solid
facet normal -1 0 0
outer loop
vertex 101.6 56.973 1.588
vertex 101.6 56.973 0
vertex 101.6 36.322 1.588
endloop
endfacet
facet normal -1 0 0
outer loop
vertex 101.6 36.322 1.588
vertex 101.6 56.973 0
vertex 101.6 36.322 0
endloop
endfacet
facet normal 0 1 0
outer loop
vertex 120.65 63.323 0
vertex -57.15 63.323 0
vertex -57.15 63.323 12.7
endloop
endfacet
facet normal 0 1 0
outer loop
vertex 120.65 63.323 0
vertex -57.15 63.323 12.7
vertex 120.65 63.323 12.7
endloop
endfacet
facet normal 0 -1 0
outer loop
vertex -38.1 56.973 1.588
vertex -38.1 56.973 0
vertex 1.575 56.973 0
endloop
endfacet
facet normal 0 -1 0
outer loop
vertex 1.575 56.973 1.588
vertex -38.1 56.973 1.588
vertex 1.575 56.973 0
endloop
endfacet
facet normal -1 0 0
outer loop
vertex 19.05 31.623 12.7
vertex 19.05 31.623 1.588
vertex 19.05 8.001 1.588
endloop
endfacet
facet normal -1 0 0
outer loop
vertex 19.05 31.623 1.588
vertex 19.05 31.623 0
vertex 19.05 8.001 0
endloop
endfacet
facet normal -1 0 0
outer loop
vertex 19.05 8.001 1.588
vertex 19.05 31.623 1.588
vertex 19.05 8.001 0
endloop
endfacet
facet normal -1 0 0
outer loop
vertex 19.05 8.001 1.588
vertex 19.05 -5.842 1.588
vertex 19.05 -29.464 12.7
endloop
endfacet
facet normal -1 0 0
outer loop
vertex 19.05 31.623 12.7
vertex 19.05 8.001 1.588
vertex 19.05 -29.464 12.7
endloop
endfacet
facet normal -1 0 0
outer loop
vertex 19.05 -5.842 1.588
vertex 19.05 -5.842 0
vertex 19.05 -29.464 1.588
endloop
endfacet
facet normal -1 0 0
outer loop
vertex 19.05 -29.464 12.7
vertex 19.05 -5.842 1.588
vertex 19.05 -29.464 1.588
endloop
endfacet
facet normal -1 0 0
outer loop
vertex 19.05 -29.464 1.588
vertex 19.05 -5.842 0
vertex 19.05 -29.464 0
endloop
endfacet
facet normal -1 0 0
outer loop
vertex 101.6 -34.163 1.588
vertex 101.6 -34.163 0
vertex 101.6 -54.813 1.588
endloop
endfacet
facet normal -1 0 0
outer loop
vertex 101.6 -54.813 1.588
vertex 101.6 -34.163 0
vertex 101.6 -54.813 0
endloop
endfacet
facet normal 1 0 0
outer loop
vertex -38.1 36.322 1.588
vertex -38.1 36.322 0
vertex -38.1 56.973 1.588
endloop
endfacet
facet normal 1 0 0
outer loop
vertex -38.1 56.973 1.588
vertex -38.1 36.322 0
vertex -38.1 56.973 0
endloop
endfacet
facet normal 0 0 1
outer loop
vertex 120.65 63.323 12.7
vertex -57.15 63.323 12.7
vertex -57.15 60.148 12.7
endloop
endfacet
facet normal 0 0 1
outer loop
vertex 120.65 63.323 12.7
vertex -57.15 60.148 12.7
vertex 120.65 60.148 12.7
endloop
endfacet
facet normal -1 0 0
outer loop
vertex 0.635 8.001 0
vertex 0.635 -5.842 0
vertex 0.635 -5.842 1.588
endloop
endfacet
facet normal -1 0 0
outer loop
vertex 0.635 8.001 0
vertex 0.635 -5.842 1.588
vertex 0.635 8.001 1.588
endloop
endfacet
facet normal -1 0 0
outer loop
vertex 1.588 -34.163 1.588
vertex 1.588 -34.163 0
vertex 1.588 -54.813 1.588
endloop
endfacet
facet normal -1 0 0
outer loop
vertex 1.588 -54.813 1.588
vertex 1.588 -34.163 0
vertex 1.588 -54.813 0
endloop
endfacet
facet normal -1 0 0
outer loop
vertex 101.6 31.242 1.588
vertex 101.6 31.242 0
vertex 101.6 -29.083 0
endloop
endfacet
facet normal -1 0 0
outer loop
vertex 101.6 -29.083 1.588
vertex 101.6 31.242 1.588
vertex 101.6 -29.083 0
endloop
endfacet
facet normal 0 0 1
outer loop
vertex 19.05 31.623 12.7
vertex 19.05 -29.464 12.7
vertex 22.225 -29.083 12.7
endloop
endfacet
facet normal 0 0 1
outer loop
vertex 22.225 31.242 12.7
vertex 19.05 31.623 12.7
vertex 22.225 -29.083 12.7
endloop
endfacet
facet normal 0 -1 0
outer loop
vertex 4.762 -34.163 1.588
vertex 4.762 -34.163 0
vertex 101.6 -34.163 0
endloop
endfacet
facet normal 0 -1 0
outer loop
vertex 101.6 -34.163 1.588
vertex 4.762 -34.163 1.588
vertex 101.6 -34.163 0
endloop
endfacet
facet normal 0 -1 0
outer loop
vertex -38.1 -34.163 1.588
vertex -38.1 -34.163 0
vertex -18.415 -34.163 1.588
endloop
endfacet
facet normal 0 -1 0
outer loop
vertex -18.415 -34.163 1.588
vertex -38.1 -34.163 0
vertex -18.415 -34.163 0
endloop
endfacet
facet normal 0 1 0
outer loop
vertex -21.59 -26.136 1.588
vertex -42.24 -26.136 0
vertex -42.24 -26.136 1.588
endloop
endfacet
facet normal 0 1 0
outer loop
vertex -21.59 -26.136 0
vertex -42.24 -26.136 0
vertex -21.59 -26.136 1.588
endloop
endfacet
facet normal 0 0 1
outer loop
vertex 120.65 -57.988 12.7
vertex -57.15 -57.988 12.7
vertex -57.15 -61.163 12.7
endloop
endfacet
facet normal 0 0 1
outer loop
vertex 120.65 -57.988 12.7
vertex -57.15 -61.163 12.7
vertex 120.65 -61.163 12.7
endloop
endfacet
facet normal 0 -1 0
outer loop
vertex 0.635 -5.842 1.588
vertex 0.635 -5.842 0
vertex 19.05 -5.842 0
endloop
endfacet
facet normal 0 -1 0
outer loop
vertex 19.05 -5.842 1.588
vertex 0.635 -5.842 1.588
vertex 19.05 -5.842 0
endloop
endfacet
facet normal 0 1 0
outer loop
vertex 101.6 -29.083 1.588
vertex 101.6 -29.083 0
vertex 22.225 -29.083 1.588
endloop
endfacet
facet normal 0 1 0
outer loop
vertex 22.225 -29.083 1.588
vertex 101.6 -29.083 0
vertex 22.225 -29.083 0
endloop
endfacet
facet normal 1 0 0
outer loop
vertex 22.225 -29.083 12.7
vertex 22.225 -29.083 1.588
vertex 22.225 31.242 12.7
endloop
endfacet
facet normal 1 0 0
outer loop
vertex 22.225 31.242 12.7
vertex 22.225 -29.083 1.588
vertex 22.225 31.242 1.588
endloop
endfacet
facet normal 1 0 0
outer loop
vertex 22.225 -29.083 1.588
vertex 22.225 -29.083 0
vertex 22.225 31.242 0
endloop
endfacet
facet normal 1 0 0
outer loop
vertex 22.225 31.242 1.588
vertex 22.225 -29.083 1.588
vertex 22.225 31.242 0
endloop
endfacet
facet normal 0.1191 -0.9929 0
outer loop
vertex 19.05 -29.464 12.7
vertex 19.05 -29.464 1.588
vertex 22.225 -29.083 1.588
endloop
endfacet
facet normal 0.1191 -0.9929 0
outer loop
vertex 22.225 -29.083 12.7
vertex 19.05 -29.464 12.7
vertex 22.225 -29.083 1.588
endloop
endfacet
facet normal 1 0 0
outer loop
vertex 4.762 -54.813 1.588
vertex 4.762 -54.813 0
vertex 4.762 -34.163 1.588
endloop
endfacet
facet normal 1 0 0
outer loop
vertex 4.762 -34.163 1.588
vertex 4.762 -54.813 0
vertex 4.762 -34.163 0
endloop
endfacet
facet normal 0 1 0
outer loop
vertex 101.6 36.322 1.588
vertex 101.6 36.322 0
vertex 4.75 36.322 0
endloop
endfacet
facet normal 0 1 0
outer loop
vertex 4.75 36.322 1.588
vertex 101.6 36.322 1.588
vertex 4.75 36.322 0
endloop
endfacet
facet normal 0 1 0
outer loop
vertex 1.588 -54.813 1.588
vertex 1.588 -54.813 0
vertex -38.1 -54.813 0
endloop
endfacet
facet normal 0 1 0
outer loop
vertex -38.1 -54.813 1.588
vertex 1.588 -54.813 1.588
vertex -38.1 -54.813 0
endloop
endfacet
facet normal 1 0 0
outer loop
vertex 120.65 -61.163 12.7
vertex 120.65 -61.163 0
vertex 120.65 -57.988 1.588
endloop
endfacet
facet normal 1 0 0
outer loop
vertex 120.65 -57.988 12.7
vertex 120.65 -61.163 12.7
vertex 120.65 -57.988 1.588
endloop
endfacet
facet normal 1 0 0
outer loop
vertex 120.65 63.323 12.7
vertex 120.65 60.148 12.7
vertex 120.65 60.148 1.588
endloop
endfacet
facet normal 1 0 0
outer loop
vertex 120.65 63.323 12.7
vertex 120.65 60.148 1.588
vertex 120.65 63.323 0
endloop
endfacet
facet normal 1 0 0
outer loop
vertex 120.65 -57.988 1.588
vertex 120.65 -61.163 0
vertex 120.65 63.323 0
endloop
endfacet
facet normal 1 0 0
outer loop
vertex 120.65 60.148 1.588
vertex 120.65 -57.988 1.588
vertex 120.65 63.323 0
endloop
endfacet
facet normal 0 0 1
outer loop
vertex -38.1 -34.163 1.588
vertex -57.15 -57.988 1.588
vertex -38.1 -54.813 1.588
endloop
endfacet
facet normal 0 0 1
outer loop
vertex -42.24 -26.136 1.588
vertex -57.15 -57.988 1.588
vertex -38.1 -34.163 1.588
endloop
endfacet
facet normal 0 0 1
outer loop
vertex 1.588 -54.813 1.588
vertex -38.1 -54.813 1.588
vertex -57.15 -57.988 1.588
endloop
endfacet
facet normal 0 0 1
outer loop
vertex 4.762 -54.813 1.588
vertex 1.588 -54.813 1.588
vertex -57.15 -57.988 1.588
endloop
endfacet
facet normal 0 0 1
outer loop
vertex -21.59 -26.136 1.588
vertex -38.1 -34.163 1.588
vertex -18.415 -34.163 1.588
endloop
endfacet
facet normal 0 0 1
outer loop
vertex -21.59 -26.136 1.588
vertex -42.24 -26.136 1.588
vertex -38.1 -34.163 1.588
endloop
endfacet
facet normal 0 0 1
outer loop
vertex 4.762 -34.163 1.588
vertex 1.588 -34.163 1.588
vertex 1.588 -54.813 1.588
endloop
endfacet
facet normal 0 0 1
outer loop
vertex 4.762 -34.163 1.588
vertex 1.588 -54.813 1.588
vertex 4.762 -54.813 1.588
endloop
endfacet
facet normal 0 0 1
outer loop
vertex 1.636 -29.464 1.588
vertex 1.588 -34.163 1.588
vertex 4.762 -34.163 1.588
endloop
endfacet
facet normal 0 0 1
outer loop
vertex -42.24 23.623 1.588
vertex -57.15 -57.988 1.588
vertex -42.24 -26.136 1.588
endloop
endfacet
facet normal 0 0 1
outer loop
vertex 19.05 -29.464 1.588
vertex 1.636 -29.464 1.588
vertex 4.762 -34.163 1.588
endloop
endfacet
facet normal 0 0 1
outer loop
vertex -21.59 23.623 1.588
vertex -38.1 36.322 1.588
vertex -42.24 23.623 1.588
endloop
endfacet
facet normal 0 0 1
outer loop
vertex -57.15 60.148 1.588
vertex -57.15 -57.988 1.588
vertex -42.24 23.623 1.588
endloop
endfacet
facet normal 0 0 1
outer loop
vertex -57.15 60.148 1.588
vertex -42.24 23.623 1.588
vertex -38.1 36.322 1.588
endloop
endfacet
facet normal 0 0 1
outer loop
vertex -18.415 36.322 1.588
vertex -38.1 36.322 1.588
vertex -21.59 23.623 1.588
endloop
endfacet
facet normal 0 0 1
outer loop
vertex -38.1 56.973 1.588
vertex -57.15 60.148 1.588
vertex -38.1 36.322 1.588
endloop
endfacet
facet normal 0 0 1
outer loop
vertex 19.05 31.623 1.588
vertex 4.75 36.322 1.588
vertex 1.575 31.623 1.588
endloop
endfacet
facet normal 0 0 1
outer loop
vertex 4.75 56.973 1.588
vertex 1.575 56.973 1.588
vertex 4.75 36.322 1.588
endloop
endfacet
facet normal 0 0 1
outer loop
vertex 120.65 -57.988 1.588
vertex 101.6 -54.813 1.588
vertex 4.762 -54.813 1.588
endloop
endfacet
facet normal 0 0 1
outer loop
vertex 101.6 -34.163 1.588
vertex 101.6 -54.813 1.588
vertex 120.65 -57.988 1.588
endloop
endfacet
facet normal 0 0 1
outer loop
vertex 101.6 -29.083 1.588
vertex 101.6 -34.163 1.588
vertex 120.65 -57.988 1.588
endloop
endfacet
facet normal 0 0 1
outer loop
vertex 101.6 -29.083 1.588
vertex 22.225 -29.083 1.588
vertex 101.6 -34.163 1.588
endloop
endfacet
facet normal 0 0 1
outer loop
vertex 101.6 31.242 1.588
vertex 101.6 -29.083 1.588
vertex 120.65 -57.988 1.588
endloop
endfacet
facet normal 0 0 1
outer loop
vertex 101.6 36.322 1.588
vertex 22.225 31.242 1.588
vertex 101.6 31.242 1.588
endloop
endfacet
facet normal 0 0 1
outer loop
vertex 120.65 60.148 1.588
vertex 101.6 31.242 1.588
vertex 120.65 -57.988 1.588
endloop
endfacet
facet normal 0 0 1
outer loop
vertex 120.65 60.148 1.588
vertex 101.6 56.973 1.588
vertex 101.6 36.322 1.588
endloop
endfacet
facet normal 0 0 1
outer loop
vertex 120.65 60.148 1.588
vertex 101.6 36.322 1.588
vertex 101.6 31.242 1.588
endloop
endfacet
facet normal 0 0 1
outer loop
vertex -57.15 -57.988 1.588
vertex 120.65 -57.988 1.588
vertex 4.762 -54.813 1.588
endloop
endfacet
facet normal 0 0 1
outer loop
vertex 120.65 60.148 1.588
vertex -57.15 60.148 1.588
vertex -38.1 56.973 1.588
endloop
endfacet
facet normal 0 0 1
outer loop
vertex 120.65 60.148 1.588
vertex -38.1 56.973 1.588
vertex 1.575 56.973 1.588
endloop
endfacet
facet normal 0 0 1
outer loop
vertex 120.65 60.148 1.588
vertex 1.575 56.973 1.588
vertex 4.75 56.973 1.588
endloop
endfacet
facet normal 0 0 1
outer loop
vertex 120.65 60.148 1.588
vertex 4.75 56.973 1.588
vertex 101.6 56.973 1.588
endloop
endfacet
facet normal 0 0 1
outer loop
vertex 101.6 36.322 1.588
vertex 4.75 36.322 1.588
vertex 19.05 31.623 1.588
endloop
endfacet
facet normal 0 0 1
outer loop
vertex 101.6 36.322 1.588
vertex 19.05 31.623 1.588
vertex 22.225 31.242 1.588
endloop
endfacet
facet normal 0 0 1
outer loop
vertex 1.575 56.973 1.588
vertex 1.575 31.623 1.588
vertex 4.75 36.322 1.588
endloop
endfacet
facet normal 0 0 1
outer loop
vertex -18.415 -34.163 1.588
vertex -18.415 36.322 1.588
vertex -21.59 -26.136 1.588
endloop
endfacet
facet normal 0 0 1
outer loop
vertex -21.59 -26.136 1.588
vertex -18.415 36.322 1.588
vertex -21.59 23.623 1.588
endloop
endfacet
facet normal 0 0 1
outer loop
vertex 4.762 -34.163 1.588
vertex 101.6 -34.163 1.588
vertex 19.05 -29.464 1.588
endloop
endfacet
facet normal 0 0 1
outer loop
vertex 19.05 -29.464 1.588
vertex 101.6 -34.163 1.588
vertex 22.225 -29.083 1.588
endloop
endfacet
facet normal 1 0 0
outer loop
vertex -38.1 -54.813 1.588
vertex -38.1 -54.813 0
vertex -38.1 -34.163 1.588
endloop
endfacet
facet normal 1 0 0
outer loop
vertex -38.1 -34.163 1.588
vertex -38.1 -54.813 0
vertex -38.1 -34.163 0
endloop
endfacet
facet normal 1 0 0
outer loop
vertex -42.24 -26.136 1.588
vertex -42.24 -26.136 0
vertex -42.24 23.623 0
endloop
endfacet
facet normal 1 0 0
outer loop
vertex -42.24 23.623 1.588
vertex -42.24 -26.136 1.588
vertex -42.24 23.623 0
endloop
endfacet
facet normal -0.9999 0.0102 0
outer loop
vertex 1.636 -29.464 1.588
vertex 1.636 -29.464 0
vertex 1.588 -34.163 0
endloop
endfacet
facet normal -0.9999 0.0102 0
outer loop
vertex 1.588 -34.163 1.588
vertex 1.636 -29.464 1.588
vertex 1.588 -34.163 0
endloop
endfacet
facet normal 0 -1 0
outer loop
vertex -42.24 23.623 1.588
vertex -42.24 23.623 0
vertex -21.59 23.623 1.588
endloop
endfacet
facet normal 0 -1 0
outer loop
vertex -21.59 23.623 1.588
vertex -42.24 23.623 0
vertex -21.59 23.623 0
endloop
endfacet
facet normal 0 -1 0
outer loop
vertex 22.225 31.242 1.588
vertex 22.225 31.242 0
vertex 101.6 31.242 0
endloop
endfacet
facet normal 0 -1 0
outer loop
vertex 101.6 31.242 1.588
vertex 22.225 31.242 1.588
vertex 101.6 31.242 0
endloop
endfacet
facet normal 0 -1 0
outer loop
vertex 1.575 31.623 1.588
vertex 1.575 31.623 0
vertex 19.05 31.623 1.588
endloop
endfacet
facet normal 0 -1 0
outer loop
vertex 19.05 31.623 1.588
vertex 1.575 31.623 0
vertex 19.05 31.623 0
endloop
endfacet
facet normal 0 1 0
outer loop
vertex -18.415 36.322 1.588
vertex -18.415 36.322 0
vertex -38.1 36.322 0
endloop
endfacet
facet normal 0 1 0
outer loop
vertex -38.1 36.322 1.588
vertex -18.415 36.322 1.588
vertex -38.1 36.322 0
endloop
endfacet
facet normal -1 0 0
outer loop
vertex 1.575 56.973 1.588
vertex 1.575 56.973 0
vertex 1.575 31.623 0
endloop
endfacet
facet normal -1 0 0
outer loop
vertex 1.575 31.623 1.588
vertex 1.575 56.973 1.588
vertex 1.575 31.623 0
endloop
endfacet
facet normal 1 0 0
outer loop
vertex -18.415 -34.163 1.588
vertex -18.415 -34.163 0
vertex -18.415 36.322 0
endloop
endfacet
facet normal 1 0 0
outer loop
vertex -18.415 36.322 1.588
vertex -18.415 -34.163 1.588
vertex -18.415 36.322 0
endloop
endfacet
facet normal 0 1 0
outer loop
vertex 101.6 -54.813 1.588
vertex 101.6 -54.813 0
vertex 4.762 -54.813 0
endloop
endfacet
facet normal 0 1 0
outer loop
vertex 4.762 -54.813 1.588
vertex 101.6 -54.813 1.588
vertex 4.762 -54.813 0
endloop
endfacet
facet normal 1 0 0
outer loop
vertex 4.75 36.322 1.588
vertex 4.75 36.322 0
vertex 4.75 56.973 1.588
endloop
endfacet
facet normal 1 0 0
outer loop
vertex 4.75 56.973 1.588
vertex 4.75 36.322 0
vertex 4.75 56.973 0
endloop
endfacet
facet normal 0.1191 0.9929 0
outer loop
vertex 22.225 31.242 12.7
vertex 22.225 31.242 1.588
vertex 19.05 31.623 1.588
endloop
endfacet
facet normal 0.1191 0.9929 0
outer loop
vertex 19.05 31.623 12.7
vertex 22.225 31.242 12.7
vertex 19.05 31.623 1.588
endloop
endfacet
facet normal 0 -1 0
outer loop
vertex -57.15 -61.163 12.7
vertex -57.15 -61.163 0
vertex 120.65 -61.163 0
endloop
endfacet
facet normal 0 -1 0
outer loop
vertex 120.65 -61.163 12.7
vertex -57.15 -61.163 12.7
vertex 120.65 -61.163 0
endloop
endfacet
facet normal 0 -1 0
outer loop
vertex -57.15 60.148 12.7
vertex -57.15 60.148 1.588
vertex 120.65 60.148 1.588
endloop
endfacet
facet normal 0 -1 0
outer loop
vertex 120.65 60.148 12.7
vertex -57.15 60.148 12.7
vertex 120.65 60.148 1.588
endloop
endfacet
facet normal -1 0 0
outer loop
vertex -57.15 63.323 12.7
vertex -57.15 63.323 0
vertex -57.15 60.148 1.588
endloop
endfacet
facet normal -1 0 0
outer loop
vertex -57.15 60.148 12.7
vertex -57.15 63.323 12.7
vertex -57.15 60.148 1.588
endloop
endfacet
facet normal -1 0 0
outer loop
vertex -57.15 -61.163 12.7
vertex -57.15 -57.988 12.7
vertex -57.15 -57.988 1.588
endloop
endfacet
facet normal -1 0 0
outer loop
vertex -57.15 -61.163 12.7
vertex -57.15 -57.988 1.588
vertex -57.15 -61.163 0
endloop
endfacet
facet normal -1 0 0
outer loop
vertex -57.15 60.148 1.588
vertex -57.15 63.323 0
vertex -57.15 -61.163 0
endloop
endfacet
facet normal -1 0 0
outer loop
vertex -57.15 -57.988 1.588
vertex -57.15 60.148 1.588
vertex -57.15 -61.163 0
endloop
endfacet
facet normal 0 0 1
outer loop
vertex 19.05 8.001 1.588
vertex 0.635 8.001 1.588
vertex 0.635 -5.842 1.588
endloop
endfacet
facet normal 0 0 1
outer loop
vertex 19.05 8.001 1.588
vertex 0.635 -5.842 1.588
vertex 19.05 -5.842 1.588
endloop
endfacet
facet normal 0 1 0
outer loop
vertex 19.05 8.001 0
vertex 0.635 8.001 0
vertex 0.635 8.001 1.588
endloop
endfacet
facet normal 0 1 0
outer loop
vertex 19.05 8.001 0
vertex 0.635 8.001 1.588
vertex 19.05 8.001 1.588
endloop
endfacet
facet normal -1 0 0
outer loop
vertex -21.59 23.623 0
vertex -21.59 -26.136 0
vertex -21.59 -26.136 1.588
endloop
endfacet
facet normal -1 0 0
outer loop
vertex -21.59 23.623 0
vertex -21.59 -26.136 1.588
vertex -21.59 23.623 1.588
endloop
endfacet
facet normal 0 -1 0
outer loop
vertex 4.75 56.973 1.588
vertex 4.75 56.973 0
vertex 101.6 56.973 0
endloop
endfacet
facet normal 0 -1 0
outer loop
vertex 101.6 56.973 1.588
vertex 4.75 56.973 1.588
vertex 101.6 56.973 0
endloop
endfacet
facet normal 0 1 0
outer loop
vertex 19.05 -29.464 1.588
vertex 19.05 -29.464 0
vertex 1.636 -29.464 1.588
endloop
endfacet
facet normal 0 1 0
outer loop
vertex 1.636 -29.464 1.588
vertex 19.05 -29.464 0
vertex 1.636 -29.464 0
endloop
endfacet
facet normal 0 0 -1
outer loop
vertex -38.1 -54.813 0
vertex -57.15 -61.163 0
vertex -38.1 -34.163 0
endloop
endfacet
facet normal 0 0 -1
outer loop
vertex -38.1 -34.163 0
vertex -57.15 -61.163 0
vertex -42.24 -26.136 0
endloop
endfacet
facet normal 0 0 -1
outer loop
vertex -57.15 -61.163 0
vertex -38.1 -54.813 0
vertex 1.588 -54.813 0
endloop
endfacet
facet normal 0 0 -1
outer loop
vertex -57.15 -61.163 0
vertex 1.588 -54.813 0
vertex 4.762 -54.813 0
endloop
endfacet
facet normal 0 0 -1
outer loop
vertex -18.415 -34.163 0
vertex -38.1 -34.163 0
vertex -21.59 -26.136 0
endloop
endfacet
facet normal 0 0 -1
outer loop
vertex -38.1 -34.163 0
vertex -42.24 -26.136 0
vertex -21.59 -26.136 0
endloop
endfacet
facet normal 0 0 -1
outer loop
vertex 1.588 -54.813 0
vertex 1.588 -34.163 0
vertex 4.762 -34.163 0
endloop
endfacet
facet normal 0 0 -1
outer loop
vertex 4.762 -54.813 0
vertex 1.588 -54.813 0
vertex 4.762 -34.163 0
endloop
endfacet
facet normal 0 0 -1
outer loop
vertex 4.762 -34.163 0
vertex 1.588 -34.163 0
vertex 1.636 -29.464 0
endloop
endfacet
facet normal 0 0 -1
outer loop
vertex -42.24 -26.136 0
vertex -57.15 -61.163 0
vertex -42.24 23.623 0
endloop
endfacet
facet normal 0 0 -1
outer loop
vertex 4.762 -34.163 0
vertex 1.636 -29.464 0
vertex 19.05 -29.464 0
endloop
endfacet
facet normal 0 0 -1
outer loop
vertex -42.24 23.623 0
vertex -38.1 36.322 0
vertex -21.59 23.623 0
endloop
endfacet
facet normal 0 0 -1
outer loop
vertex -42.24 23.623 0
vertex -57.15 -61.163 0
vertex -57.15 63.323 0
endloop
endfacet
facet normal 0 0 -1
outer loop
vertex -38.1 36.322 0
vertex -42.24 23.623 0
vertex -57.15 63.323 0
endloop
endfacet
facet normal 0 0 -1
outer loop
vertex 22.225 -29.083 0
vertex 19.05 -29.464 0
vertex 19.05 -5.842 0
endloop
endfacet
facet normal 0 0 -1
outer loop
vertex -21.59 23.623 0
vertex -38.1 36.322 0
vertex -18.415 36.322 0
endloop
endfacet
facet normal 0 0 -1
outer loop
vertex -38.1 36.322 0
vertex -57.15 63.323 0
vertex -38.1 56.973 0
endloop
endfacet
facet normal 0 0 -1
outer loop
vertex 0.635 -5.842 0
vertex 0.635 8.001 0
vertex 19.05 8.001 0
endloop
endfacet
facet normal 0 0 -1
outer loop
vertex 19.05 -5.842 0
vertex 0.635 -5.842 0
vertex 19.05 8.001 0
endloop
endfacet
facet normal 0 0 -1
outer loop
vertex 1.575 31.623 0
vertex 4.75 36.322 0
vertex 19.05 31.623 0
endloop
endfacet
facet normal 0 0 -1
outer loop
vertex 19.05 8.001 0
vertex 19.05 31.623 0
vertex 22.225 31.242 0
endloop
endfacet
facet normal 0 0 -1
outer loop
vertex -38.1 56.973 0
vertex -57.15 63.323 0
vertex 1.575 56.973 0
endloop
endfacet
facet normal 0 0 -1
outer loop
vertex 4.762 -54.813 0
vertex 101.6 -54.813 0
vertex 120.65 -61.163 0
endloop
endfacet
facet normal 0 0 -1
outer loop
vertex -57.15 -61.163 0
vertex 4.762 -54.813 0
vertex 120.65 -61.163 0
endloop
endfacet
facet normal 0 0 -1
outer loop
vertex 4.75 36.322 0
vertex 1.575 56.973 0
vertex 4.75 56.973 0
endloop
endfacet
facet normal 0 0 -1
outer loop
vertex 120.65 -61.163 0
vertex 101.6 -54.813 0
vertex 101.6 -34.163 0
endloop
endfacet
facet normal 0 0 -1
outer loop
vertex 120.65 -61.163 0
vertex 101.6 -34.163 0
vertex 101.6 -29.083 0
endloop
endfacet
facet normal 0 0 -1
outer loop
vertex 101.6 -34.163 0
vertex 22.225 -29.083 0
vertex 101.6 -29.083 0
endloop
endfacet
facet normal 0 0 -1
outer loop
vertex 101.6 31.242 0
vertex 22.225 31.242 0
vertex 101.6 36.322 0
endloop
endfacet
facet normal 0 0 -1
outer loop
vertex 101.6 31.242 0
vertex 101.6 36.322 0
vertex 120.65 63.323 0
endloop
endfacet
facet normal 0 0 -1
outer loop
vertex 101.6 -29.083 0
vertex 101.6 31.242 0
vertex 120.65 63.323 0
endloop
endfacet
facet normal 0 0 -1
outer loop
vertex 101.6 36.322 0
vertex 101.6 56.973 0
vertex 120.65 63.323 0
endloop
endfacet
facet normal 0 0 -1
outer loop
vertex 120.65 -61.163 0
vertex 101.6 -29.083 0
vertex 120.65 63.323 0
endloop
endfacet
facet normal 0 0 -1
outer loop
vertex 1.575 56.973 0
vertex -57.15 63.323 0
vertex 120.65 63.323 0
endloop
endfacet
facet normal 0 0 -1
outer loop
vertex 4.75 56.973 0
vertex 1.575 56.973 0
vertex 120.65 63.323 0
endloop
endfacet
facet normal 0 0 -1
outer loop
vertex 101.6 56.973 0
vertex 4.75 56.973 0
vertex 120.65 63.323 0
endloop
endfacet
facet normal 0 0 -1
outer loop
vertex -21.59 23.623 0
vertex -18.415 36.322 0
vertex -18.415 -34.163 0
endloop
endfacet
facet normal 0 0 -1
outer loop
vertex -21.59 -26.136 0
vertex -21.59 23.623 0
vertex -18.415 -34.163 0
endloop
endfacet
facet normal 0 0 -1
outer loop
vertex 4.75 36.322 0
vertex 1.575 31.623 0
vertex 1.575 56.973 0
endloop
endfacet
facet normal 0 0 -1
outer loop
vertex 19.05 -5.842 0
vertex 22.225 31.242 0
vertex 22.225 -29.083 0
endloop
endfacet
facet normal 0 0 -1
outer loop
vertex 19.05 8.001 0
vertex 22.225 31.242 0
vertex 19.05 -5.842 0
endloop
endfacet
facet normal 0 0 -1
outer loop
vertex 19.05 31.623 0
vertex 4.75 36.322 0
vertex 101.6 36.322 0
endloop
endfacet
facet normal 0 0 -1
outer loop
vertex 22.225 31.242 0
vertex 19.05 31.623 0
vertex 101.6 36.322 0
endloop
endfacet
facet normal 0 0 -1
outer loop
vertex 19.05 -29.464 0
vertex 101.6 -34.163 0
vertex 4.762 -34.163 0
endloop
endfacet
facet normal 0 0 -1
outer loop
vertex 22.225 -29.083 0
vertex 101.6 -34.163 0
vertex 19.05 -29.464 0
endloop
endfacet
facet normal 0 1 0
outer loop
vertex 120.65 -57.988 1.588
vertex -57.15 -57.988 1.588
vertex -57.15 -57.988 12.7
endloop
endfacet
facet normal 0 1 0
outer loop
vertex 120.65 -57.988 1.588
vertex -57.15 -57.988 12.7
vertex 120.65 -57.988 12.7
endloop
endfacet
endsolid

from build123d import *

# Parameters (mm, degrees)
F0_W     = 18.415
F0_H     = 13.843
F1_DEPTH = 1.5875
F0_W_2   = 20.6502
F0_H_2   = 49.7587174177
F0_W_3   = 177.8
F0_H_3   = 3.175
F2_DEPTH = 12.7


with BuildPart() as f1:
    # F0 (on Top) → F1 (new body)
    with BuildSketch(Plane.XY):
        with Locations((9.8425, 1.0799015641)):
            Rectangle(F0_W, F0_H)
    extrude(amount=F1_DEPTH)



with BuildPart() as f1b:
    # F0 (on Top) → F1, piece 2 (new body)
    with BuildSketch(Plane.XY):
        Polygon((120.65, -54.8127984359), (120.65, 56.9726015641), (101.6, 56.9726015641), (101.6, 36.3224015641), (4.7498, 36.3224015641), (4.7498, 56.9726015641), (1.5748, 56.9726015641), (1.5748, 33.1474015641), (1.5748, 31.6234015641), (19.05, 31.6234015641), (22.225, 31.2424015641), (101.6, 31.2424015641), (101.6, -29.0825984359), (22.225, -29.0825984359), (19.05, -29.4635984359), (1.6357024433, -29.4635984359), (1.5875, -34.1625984359), (1.5875, -54.8127984359), (4.7625, -54.8127984359), (4.7625, -34.1625984359), (101.6, -34.1625984359), (101.6, -54.8127984359), align=None)
        Polygon((-38.1, 56.9726015641), (-57.15, 56.9726015641), (-57.15, -54.8127984359), (-38.1, -54.8127984359), (-38.1, -34.1625984359), (-18.415, -34.1625984359), (-18.415, 36.3224015641), (-38.1, 36.3224015641), align=None)
        with Locations((-31.9151, -1.256839727)):
            Rectangle(F0_W_2, F0_H_2, mode=Mode.SUBTRACT)
        Polygon((-38.1, -54.8127984359), (-57.15, -54.8127984359), (-57.15, -57.9877984359), (120.65, -57.9877984359), (120.65, -54.8127984359), (101.6, -54.8127984359), (4.7625, -54.8127984359), (1.5875, -54.8127984359), align=None)
        Polygon((120.65, 60.1476015641), (-57.15, 60.1476015641), (-57.15, 56.9726015641), (-38.1, 56.9726015641), (1.5748, 56.9726015641), (4.7498, 56.9726015641), (101.6, 56.9726015641), (120.65, 56.9726015641), align=None)
    extrude(amount=F1_DEPTH)


with BuildPart() as f1_1:
    add(f1.part)

    add(f1b.part)  # F2 merges F1b
    # F0 (on Top) → F2 (join)
    with BuildSketch(Plane.XY):
        Polygon((22.225, 31.2424015641), (19.05, 31.6234015641), (19.05, 8.0014015641), (19.05, -5.8415984359), (19.05, -29.4635984359), (22.225, -29.0825984359), align=None)
        with Locations((31.75, -59.5752984359)):
            Rectangle(F0_W_3, F0_H_3)
        with Locations((31.75, 61.7351015641)):
            Rectangle(F0_W_3, F0_H_3)
    extrude(amount=F2_DEPTH)


solid = f1_1.part
